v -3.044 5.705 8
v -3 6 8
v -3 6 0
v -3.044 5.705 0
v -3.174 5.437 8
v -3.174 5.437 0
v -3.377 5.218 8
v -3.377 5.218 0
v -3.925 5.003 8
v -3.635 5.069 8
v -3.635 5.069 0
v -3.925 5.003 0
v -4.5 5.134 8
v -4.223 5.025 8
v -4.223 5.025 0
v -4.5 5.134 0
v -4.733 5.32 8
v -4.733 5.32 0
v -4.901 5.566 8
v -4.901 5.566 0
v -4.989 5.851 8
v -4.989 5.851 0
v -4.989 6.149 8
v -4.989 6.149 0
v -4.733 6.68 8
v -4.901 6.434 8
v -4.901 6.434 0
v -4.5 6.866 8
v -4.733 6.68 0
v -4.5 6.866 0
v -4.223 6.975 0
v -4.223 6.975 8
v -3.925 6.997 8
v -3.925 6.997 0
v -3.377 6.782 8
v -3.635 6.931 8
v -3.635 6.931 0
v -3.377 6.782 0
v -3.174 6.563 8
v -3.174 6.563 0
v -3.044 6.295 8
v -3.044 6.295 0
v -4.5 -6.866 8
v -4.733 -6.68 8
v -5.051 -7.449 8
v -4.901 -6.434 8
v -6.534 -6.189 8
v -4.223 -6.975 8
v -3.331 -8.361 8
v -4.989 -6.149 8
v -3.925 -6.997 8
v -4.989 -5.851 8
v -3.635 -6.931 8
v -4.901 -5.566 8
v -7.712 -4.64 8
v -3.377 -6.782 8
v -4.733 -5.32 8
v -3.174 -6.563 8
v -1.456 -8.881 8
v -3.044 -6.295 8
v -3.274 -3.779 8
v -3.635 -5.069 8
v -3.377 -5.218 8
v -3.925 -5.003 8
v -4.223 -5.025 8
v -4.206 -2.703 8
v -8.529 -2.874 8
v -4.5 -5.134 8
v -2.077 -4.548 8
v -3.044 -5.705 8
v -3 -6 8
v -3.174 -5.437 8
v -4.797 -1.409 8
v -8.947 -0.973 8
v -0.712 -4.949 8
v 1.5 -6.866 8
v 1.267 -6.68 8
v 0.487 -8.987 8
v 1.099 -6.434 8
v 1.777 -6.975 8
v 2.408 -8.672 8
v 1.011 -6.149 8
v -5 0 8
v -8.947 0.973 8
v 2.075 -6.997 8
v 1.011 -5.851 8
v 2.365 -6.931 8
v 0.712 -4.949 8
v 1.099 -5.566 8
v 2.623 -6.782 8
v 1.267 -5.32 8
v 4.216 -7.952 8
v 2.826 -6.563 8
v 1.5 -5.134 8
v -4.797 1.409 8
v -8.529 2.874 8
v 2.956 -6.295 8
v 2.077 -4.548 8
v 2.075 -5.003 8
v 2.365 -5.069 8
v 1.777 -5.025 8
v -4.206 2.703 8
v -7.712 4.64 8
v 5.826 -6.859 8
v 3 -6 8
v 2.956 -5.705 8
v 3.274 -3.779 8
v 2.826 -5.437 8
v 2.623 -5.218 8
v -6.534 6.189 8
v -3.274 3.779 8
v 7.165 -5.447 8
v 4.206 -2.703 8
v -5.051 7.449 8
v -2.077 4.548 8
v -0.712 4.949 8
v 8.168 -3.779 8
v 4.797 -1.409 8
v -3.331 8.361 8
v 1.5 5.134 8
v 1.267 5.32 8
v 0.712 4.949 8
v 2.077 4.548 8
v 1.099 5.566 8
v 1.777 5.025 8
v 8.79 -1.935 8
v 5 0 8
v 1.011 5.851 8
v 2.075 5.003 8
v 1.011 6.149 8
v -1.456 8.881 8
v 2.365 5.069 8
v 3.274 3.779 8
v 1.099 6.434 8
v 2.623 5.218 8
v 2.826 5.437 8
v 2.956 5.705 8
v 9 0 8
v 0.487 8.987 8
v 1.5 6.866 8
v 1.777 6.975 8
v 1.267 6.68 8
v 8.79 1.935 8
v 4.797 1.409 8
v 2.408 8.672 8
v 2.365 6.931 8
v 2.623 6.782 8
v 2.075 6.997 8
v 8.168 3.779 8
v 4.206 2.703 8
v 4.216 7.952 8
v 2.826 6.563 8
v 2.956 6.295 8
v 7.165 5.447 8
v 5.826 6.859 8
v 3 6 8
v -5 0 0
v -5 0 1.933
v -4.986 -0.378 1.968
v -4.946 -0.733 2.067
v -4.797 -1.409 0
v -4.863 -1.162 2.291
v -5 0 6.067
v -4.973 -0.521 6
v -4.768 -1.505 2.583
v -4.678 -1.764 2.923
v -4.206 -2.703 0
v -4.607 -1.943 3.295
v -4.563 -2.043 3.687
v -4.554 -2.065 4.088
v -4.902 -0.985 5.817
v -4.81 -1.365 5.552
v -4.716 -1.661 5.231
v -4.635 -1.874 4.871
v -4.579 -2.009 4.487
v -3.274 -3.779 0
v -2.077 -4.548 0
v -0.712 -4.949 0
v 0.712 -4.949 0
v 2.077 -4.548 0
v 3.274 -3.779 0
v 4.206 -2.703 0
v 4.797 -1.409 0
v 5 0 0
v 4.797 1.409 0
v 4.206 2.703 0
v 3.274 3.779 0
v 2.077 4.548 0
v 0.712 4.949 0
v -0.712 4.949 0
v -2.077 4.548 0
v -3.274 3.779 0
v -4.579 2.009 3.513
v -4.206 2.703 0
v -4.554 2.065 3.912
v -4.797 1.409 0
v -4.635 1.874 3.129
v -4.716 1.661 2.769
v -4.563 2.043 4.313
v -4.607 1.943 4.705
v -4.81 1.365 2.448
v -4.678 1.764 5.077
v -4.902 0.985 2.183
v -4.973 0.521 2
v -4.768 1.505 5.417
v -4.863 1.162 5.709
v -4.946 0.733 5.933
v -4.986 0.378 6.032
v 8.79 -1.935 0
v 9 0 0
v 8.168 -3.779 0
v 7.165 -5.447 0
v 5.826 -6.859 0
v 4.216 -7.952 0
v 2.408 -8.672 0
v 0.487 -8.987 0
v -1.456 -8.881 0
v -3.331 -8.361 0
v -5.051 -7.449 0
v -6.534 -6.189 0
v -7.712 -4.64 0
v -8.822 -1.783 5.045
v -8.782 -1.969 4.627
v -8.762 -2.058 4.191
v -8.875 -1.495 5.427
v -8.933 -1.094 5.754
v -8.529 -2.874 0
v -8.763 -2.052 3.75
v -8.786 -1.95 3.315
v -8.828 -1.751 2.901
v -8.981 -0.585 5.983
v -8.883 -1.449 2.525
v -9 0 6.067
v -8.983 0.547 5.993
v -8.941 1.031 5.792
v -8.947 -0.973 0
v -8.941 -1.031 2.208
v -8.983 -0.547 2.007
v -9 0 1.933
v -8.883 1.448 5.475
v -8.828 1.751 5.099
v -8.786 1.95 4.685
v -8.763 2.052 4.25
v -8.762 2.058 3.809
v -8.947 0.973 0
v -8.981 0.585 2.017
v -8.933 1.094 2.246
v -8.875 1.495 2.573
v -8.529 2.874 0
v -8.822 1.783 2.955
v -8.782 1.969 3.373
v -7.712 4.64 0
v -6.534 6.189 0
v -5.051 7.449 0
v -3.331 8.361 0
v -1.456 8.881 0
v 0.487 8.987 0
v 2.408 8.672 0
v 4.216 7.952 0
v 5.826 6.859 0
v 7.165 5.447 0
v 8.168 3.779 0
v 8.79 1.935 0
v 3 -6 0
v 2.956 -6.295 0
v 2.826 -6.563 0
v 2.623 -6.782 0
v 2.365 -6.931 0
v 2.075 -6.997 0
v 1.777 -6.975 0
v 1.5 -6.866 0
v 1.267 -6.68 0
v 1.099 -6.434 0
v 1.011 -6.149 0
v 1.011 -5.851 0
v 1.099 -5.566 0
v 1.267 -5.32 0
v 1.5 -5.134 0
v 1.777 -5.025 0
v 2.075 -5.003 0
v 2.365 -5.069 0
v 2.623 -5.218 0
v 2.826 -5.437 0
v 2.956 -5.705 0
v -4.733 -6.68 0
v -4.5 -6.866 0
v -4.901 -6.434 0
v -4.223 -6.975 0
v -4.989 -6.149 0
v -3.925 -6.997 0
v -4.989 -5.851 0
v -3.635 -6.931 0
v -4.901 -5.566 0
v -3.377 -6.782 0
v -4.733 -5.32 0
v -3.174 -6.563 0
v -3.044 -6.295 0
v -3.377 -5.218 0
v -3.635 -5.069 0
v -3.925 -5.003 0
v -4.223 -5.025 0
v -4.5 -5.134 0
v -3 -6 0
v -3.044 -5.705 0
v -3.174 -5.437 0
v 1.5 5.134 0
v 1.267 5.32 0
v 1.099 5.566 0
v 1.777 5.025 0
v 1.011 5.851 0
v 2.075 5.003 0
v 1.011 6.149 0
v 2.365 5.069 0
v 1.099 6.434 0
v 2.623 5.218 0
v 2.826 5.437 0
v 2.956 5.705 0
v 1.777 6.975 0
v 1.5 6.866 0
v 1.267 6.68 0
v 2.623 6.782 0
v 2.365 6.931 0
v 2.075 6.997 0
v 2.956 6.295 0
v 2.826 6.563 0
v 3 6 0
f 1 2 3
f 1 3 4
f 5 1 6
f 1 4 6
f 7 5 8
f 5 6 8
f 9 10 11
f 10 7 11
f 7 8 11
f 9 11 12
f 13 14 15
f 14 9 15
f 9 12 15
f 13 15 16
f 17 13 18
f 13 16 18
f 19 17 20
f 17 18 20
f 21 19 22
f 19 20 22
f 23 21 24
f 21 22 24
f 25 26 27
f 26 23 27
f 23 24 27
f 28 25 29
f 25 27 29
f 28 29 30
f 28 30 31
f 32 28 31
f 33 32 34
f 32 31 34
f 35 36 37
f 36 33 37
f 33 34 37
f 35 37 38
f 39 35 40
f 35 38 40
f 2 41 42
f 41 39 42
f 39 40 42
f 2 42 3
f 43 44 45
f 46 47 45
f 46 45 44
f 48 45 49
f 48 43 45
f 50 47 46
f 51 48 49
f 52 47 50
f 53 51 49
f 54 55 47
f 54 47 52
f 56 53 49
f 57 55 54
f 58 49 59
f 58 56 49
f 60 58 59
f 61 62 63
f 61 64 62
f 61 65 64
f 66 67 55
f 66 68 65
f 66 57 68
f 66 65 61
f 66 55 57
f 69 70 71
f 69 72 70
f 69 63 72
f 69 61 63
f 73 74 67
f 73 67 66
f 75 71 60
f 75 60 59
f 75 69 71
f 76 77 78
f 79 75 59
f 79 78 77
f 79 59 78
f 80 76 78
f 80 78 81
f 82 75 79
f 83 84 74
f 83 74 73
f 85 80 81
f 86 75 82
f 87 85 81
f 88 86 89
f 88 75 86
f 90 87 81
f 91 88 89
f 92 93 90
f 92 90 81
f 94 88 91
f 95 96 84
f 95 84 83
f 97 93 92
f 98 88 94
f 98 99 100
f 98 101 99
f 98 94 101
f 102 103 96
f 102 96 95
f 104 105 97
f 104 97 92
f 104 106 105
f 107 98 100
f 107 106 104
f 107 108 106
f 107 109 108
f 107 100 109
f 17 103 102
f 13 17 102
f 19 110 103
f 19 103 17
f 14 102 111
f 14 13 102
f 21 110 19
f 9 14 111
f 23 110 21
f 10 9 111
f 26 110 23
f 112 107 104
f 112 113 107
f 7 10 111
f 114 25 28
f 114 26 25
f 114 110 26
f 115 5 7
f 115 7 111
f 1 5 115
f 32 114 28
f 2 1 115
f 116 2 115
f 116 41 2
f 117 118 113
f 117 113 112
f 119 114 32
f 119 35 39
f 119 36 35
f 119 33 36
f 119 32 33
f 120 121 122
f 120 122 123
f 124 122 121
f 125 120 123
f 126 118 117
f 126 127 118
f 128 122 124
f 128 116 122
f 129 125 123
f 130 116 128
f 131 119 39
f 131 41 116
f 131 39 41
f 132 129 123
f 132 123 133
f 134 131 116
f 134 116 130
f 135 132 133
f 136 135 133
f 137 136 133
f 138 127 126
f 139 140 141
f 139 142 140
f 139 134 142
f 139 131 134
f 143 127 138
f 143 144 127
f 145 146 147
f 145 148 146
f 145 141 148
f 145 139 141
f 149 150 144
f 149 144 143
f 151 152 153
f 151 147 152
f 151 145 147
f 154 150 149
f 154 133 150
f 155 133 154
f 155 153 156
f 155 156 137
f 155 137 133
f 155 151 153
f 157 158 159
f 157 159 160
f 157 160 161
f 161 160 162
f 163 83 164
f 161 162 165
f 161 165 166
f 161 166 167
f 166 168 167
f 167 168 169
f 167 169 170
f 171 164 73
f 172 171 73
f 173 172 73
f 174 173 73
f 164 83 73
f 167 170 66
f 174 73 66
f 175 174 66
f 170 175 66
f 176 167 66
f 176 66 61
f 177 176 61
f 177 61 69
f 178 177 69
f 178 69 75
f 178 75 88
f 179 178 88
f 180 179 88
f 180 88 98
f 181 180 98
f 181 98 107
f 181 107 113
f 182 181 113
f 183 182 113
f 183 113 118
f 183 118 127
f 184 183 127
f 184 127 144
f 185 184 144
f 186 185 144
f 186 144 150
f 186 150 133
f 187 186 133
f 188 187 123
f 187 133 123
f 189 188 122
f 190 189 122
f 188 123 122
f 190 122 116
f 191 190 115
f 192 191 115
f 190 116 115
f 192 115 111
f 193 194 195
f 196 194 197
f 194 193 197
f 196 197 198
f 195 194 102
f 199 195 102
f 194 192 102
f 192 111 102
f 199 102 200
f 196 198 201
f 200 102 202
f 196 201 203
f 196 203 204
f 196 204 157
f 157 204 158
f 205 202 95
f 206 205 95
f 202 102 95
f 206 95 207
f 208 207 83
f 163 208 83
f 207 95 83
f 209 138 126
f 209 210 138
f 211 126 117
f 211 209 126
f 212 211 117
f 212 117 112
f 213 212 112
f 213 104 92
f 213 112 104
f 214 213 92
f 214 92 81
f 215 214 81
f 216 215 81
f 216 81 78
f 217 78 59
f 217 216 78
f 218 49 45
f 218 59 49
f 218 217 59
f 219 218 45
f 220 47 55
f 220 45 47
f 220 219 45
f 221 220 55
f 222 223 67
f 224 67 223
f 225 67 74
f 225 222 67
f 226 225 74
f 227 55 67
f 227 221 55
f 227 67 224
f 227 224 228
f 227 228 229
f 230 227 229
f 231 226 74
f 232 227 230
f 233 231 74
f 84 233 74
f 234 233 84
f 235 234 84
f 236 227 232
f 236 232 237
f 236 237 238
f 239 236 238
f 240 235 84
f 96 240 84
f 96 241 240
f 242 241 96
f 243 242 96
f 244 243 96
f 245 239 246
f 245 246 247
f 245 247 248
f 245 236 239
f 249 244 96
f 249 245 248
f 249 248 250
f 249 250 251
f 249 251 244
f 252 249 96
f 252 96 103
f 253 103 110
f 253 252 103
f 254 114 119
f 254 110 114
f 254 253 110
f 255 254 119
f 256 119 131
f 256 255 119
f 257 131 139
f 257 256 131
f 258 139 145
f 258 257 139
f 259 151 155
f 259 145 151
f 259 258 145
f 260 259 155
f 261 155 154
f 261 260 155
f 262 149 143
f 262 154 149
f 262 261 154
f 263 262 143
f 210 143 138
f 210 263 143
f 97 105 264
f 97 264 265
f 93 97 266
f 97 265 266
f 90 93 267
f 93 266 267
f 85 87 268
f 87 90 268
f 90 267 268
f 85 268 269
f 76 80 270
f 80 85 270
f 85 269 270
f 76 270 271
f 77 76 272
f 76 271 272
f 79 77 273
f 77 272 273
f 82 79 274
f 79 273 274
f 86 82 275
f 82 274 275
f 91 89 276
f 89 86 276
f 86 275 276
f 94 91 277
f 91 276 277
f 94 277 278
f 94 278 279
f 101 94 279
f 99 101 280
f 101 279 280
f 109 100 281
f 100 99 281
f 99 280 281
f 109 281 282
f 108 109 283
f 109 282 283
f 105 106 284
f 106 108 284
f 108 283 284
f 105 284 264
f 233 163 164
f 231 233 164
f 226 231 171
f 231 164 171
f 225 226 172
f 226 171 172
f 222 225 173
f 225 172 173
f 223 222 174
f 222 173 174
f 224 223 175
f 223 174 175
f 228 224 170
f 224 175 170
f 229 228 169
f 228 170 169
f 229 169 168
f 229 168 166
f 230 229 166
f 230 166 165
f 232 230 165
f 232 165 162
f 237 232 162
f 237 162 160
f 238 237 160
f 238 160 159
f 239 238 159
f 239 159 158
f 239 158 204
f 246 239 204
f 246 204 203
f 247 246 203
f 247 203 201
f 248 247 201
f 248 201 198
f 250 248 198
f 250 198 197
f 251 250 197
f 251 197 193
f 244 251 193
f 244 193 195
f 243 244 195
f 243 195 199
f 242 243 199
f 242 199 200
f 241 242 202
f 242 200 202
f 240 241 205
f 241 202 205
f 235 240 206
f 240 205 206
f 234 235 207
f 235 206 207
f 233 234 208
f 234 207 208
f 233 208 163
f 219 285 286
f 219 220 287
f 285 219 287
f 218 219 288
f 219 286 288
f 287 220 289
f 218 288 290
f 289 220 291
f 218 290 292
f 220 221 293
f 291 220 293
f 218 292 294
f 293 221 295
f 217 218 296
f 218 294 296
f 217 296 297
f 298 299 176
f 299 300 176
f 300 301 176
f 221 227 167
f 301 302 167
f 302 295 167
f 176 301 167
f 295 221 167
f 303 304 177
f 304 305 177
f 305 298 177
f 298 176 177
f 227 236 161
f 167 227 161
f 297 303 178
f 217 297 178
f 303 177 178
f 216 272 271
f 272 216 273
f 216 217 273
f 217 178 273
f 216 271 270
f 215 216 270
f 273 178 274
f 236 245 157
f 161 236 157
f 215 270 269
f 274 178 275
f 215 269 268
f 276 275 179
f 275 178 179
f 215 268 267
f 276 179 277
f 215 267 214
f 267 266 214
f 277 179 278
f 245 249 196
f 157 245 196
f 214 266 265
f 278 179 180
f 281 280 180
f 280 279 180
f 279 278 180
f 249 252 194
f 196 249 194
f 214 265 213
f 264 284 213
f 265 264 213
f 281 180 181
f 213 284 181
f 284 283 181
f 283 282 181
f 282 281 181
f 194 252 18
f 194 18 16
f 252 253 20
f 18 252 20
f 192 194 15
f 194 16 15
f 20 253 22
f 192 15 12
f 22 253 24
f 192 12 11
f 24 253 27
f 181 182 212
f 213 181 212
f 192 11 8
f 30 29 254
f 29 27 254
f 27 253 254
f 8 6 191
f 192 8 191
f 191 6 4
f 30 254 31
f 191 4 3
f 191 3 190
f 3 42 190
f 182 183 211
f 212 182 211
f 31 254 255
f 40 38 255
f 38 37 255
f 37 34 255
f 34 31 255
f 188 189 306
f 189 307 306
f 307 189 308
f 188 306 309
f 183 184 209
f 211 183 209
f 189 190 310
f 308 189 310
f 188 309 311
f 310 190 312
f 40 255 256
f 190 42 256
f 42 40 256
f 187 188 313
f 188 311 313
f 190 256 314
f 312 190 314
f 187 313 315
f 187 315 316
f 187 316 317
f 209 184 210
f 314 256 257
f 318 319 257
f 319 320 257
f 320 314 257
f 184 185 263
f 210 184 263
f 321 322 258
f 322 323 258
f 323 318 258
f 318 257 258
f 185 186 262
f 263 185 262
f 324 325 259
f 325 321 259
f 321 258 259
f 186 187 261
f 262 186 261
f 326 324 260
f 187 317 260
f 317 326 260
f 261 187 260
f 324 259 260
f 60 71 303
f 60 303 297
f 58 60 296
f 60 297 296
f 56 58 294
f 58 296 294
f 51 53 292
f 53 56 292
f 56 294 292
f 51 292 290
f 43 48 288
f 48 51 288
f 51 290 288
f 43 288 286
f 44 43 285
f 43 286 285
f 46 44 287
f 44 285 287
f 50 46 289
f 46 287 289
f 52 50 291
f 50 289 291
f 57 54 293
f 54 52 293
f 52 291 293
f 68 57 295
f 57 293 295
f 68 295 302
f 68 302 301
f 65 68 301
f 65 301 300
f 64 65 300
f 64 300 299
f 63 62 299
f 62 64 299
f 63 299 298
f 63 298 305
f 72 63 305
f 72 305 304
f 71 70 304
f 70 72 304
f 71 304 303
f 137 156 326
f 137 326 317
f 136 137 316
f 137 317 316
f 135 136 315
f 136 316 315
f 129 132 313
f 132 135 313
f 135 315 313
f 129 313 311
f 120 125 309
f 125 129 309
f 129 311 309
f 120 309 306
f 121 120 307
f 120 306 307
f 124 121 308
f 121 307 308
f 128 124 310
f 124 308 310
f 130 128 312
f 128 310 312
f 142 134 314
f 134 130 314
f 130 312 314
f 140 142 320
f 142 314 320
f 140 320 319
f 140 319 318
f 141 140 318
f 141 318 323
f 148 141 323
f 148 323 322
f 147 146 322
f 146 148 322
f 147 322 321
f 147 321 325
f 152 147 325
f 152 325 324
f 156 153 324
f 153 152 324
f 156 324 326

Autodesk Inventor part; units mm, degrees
ref_plane "XZ Plane" through (0, 0, 0) normal (0, 1, 0) x (-1, 0, 0)
ref_plane "XY Plane" through (0, 0, 0) normal (0, 0, 1) x (1, 0, 0)
sketch "Sketch1" plane through (0, 0, 0) normal (0, 0, 1) x (1, 0, 0)
  circle A0 centre (0, 0) radius 9
  circle A1 centre (-4, 6) radius 1
  circle A2 centre (2, 6) radius 1
  circle A3 centre (2, -6) radius 1
  circle A4 centre (-4, -6) radius 1
  dimension "d0" = 18
  dimension "d2" = 2
  dimension "d3" = 12
  dimension "d4" = 6
  dimension "d6" = 4
  dimension "d7" = 6
  dimension "d8" = 2
  dimension "d15" = 2
extrude "Extrusion1" add sketch "Sketch1" along normal blind 8
sketch "Sketch2" plane through (0, 0, 8) normal (0, 0, -1) x (-1, 0, 0)
  circle A0 centre (0, 0) radius 5
  circle A1 centre (-2, 6) radius 1 projected
  dimension "d11" = 10
extrude "Extrusion2" cut sketch "Sketch2" along normal blind 18 contours A0
ref_plane "Work Plane1" through (-9, 0, 0) normal (1, 0, 0) x (0, 1, 0)
sketch "Sketch3" plane through (-9, 0, 0) normal (1, 0, 0) x (0, 1, 0)
  line L0 (9, 8) -> (-9, 8) projected
  line L1 (9, 0) -> (-9, 0) projected
  line L2 (9, 0) -> (9, 8) projected
  point P0 (0, 0)
  point P1 (0, 4)
  point P2 (9, 4)
  point P3 (0, 0)
hole "Hole1" at (-9, 0, 4) direction (1, 0, 0) diameter 4.134 depth 4.5 thread size "M5x0.8" class "6H" standard "ISO Metric profile"
equation "\"d4\" = 0.5 * d3"
properties part number "13"
